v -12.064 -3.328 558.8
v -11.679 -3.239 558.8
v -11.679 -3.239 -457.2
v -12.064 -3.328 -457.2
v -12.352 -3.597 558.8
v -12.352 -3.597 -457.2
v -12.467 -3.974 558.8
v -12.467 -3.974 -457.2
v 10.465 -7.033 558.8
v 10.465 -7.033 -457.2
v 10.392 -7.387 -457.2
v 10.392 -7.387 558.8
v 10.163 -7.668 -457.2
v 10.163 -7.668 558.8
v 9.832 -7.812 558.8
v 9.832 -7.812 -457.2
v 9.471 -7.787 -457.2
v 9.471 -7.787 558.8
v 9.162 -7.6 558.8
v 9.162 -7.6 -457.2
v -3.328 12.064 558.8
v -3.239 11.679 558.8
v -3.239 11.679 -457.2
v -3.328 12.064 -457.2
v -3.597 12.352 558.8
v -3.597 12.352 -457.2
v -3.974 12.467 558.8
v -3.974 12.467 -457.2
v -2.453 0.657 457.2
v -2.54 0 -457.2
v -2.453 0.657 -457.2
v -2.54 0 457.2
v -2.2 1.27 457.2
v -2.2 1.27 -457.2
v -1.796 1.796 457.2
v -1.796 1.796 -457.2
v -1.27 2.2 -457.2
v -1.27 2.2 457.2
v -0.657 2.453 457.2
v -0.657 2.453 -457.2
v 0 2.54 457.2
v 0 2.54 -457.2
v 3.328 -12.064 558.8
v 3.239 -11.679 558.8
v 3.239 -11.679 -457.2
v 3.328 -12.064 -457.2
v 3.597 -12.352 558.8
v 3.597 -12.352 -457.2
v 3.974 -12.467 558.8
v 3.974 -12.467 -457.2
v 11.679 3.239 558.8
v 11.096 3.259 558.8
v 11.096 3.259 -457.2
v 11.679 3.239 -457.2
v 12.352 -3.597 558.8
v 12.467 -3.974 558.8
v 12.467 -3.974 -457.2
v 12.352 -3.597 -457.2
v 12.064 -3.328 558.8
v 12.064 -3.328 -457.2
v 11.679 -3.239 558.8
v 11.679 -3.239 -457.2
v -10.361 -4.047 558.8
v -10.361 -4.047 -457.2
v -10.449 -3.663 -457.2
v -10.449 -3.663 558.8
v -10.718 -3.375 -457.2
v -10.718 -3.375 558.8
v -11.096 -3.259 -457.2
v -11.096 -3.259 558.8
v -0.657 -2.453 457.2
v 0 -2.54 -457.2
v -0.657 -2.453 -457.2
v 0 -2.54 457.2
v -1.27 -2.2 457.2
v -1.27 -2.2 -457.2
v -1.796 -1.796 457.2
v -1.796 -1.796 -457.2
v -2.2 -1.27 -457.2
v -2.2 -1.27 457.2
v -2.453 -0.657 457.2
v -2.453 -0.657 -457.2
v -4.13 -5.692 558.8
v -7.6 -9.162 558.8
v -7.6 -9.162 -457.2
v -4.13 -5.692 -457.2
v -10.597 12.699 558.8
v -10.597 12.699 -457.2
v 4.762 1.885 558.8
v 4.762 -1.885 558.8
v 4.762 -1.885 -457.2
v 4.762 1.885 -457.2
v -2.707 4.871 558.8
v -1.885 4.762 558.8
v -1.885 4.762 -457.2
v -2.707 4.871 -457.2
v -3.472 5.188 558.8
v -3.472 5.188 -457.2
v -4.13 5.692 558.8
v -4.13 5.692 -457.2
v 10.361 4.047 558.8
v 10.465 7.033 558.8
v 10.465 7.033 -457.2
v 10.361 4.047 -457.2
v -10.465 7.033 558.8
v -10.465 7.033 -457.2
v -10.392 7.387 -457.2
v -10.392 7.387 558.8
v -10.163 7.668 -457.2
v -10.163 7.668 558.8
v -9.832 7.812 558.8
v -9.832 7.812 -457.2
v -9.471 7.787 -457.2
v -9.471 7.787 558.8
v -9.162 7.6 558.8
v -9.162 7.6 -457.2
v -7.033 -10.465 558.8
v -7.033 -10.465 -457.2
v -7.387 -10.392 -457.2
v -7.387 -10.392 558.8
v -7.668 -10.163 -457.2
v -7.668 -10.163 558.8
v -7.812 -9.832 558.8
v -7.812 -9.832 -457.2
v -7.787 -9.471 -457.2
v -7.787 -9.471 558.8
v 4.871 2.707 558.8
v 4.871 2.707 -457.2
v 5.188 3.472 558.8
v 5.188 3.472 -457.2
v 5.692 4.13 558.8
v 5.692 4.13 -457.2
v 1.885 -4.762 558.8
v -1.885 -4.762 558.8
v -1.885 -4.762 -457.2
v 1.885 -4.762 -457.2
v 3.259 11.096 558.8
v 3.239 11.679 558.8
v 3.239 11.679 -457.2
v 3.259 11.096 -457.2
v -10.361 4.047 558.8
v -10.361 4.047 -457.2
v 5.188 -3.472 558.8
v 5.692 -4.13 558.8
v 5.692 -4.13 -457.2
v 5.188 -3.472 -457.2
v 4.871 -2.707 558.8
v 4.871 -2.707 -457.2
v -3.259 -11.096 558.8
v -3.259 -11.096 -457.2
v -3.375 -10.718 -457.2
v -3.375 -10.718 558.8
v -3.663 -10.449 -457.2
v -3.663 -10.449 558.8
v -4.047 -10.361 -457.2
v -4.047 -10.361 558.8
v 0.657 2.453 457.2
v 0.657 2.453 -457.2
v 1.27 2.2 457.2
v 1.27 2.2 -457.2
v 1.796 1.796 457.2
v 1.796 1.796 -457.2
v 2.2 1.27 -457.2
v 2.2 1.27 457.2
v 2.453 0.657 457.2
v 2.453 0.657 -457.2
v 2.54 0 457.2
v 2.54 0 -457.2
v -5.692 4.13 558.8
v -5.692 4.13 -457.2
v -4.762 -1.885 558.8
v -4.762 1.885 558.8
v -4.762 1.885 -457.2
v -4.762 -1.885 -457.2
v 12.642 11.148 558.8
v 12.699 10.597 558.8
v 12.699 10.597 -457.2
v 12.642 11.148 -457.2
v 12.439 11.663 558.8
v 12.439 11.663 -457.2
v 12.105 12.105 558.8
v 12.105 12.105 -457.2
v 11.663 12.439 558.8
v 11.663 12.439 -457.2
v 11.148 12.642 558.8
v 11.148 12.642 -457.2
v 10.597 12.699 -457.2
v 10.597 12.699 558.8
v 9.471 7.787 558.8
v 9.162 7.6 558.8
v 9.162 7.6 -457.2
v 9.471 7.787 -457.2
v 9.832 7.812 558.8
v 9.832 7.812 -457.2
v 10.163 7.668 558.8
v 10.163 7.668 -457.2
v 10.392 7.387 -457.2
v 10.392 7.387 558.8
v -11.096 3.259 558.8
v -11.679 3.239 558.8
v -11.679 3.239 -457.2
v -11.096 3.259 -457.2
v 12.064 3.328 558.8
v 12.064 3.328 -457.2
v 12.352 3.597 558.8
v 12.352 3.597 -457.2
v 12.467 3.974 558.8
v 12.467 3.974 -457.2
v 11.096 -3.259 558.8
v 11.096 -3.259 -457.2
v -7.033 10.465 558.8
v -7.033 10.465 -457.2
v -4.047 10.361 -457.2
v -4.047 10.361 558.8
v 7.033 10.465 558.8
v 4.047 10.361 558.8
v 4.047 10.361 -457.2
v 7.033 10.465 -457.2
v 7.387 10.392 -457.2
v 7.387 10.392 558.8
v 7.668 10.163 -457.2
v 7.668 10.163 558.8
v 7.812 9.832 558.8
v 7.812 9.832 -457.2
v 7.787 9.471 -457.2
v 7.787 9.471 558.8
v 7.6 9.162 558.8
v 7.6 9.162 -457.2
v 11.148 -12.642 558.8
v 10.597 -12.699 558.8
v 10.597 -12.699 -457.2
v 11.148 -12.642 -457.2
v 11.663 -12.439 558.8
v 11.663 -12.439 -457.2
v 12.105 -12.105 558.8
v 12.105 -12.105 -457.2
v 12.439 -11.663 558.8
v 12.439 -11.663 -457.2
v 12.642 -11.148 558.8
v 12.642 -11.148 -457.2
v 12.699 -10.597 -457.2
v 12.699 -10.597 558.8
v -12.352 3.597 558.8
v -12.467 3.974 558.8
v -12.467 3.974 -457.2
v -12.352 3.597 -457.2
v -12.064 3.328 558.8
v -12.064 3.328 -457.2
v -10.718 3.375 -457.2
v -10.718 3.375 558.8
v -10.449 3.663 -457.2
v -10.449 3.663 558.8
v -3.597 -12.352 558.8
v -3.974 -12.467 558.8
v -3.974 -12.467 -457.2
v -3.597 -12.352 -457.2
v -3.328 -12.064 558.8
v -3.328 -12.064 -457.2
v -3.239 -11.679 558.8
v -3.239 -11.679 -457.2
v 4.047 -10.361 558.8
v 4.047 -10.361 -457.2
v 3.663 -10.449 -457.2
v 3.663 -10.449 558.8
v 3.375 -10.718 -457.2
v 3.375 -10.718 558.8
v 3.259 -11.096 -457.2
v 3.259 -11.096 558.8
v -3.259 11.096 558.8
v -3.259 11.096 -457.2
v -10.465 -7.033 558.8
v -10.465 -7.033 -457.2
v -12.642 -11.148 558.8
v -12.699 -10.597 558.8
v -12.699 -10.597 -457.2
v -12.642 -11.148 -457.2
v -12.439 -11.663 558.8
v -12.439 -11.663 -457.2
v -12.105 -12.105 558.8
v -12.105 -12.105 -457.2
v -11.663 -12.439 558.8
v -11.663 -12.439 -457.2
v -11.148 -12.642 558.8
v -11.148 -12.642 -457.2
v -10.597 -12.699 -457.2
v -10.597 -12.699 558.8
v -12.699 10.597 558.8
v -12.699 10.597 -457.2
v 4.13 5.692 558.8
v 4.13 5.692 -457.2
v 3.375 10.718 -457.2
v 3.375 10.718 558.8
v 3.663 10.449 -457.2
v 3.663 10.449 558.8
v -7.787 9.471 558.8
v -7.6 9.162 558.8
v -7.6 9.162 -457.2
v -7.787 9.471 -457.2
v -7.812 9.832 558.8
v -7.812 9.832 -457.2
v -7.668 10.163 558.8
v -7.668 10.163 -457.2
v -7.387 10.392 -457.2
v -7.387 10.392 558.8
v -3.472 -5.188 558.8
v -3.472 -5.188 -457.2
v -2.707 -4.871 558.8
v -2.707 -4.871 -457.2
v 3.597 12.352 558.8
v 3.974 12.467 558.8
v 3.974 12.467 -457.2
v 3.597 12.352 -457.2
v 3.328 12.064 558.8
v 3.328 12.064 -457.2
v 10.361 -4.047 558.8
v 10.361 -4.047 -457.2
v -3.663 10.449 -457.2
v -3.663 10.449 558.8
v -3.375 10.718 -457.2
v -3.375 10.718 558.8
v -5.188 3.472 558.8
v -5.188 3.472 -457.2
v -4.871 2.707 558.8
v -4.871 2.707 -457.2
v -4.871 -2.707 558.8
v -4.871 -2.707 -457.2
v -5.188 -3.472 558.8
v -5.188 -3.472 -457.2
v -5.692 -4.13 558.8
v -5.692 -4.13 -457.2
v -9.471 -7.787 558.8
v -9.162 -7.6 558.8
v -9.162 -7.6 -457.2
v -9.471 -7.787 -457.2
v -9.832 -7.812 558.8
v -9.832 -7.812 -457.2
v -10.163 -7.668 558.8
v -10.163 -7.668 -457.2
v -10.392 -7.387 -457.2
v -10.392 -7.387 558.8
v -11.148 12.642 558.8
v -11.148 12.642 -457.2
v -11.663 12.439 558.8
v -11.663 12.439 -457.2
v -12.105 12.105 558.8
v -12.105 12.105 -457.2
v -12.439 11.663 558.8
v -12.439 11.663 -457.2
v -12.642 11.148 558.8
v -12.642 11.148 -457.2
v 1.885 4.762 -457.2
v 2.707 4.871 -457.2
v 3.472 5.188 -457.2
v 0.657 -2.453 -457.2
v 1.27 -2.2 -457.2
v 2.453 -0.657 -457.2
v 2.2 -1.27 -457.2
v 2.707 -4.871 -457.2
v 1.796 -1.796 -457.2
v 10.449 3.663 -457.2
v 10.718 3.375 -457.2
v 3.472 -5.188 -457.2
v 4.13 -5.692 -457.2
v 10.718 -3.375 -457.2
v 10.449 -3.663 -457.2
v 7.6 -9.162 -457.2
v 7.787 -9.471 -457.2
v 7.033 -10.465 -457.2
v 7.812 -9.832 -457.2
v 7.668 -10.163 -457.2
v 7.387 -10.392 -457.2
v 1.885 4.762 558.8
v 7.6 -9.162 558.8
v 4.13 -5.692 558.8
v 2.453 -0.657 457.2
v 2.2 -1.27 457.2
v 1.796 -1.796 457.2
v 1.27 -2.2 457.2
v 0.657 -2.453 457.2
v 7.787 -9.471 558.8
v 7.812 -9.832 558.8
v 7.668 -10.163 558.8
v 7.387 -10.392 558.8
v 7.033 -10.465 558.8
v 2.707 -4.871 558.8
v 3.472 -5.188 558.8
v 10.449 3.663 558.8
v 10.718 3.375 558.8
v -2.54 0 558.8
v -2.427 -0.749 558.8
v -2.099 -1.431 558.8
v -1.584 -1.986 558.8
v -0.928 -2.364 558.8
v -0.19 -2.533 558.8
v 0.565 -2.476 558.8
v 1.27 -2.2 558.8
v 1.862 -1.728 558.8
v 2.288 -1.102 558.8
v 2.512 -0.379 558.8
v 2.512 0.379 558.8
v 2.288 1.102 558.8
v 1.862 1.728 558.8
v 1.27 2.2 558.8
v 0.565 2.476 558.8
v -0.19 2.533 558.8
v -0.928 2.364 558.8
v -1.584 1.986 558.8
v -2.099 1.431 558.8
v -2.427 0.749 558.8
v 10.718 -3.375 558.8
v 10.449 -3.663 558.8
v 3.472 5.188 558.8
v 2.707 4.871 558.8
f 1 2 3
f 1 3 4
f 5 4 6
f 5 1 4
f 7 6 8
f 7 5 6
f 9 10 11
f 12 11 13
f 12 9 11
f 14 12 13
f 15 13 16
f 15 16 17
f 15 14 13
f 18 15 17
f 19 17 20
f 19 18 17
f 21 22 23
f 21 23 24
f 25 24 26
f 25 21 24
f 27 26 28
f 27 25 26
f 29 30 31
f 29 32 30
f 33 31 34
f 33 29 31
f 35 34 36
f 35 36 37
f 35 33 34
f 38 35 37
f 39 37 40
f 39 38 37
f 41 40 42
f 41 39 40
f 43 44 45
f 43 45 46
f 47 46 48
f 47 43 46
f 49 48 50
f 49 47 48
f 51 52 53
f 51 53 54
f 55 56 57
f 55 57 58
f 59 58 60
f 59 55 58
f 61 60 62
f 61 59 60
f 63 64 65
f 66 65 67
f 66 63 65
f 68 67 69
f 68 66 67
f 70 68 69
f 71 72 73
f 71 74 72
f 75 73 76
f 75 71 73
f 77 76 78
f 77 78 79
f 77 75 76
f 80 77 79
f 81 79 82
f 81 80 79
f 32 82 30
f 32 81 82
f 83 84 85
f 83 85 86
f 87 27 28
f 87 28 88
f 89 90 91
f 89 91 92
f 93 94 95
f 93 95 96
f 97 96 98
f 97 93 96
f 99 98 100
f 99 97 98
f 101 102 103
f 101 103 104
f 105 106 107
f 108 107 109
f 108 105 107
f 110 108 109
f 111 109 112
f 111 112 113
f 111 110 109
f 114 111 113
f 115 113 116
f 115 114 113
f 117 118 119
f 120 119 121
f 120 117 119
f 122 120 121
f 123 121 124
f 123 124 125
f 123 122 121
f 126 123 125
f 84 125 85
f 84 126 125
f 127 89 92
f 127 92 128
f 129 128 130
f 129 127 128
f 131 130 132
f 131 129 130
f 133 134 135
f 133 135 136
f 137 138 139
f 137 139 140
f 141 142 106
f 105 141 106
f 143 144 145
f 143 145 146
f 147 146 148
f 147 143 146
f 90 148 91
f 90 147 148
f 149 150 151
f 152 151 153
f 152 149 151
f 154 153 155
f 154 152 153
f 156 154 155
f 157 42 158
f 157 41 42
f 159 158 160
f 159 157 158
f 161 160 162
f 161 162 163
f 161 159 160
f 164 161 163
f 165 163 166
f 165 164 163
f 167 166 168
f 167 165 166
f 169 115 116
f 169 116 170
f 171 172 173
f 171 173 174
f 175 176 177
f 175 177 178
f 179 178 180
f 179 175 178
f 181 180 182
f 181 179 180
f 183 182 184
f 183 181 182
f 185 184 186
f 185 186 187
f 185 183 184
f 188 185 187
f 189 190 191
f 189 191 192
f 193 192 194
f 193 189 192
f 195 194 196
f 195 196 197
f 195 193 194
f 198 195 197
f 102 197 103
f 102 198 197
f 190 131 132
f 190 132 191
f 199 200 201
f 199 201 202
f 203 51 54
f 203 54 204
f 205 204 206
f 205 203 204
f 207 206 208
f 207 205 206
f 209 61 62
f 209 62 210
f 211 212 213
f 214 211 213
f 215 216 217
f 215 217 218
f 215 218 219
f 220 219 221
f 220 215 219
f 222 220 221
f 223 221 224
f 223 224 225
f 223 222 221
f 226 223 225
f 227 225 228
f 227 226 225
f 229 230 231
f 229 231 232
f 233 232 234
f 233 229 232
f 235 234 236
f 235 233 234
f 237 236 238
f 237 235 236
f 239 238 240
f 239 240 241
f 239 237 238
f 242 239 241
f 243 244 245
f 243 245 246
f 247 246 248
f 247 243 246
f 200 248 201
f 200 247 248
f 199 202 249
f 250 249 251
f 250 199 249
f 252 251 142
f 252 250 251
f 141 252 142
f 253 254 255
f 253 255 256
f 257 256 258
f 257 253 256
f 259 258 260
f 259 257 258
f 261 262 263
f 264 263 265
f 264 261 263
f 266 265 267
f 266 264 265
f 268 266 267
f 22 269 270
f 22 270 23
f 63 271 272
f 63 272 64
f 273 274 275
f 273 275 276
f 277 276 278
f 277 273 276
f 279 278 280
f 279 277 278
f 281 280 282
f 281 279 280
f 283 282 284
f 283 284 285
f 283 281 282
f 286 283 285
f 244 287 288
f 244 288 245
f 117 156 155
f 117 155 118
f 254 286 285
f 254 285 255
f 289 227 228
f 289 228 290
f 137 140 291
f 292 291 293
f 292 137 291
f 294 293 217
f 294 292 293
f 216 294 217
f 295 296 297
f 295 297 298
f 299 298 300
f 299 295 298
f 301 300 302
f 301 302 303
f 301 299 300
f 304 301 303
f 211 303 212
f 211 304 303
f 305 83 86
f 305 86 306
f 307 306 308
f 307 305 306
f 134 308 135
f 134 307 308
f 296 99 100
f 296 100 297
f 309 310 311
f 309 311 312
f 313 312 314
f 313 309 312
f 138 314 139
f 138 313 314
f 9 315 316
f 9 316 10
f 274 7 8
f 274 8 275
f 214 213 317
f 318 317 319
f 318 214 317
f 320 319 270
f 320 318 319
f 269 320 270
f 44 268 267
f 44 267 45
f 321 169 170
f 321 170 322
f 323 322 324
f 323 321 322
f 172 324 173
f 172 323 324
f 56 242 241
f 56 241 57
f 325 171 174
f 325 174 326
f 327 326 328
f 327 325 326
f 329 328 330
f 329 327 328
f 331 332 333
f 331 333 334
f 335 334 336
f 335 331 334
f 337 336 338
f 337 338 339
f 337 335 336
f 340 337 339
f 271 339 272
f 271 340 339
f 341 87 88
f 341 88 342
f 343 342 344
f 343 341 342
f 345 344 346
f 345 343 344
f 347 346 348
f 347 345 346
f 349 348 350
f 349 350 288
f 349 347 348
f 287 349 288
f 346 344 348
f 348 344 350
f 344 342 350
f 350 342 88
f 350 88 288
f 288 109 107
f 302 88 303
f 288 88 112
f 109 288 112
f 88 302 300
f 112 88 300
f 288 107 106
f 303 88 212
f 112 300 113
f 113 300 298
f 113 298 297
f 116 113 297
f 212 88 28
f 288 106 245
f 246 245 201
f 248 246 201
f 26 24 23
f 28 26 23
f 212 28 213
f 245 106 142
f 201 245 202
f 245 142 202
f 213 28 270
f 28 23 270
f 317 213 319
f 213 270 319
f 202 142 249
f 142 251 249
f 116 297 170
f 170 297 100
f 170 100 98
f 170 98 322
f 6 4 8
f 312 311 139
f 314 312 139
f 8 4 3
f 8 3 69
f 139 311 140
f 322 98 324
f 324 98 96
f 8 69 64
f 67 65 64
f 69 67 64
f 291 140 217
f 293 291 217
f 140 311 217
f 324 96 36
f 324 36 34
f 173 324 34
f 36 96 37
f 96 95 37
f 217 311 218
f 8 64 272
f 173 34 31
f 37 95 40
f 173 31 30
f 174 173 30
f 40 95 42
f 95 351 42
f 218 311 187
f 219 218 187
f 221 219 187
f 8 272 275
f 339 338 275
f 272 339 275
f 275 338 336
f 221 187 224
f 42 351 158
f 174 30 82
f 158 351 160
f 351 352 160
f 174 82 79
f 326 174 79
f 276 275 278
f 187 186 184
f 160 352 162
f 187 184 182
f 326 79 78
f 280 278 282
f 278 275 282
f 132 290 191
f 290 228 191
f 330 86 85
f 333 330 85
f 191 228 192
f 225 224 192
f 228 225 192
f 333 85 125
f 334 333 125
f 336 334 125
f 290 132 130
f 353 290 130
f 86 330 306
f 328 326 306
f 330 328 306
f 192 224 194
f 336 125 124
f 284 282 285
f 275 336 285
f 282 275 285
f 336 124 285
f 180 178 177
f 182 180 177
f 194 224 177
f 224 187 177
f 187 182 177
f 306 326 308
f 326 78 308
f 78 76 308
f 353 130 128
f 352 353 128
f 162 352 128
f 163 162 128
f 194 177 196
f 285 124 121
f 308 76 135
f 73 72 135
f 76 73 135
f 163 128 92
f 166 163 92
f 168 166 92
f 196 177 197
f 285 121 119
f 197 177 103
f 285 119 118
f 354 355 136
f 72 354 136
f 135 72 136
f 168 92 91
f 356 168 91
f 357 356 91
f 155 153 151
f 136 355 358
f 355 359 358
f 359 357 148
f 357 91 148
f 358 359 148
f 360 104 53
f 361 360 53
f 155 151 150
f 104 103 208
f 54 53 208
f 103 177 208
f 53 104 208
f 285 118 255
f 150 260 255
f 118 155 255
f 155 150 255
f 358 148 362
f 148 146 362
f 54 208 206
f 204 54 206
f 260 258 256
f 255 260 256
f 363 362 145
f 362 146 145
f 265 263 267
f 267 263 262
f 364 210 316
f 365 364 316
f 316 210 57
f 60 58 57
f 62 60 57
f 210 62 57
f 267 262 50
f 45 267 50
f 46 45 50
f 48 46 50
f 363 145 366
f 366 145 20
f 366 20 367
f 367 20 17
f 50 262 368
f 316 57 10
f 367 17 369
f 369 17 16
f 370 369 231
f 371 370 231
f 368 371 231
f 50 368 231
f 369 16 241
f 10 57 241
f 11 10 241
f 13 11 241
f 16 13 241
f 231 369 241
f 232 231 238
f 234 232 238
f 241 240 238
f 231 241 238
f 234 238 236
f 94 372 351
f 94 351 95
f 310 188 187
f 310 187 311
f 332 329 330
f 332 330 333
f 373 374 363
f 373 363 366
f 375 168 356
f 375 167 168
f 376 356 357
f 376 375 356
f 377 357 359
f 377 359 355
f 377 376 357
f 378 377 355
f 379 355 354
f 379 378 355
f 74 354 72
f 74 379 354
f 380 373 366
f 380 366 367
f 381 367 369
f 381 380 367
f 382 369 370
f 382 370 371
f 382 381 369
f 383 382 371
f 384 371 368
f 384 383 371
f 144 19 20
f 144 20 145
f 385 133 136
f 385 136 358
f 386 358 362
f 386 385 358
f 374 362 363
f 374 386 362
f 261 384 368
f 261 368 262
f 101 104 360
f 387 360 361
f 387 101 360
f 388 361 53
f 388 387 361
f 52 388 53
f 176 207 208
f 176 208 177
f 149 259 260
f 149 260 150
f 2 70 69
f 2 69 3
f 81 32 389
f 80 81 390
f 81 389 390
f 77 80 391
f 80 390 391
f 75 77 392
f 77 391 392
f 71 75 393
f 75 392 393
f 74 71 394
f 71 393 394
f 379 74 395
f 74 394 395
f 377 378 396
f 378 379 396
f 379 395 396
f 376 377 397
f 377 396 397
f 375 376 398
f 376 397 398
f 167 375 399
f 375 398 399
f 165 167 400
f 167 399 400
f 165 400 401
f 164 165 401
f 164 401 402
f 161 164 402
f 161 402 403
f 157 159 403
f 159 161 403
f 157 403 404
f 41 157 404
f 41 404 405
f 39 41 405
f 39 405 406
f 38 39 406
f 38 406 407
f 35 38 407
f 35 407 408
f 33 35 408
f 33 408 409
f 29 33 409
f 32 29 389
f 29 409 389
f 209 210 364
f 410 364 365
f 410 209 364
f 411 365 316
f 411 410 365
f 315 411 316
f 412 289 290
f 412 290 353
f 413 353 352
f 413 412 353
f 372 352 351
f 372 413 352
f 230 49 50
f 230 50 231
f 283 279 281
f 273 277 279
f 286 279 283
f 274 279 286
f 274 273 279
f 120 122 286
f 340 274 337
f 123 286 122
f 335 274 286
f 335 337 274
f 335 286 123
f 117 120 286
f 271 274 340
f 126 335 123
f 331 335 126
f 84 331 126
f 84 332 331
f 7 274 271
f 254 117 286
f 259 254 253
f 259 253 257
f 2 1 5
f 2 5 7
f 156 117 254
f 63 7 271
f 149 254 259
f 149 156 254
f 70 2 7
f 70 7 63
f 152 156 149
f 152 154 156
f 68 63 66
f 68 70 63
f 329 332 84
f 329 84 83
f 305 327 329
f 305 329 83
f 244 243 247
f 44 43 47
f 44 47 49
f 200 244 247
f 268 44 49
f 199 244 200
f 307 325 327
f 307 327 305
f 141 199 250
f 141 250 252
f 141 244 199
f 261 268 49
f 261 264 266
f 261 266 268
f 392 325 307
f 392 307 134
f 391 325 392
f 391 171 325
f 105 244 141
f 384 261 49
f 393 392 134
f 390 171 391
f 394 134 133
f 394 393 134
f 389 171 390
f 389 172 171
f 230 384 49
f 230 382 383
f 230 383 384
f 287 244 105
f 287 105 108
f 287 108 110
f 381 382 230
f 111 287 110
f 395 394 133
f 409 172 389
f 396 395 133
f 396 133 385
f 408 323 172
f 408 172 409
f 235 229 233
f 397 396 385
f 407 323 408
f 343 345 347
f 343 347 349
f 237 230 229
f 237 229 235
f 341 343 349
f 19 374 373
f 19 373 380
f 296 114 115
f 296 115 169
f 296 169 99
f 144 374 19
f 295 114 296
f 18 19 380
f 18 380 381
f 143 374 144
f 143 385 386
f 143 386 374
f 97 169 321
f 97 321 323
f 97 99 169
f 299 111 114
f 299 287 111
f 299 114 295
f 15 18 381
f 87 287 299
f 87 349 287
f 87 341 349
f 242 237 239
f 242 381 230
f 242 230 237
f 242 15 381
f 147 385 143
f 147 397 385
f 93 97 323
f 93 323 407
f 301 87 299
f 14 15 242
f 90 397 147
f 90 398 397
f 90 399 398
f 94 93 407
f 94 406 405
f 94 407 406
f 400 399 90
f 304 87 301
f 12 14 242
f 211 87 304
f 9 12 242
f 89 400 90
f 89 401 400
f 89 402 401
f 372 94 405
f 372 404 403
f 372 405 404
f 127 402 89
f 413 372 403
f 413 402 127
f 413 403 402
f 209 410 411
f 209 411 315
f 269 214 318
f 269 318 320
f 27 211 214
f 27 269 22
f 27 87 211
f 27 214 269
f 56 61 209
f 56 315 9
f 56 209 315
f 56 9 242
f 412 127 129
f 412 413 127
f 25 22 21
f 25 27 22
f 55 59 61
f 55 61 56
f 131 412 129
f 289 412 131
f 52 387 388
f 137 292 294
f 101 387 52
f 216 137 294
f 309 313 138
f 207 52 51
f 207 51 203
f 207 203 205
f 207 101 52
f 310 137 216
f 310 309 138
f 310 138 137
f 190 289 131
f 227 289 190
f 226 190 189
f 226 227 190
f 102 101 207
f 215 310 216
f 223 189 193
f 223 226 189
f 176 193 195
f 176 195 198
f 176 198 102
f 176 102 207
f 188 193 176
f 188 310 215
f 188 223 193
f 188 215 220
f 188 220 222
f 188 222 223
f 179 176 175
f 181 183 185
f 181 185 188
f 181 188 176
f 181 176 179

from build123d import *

# Parameters (mm, degrees)
BOSS_EXTRUDE1_DEPTH = 457.2
CIRPATTERN1_COUNT   = 4
BOSS_EXTRUDE2_START = 101.6
SKETCH4_R           = 2.54
BOSS_EXTRUDE2_DEPTH = 101.6


with BuildPart() as part:
    # Sketch3 → Boss-Extrude1 (new, symmetric)
    with BuildSketch(Plane.XY):
        with BuildLine():
            Line((0, 4.7625), (-1.884807374, 4.7625))
            ThreePointArc((-1.884807374, 4.7625), (-3.099827272, 5.004182484), (-4.129871405, 5.69243597))
            Line((-4.129871405, 5.69243597), (-7.599623114, 9.162187679))
            ThreePointArc((-7.599623114, 9.162187679), (-7.759888701, 10.006330839), (-7.033220609, 10.464824259))
            Line((-7.033220609, 10.464824259), (-4.047481702, 10.360559959))
            ThreePointArc((-4.047481702, 10.360559959), (-3.501205536, 10.564804249), (-3.259352476, 11.095502353))
            Line((-3.259352476, 11.095502353), (-3.23896419, 11.679346474))
            ThreePointArc((-3.23896419, 11.679346474), (-3.443208479, 12.225622641), (-3.973906584, 12.467475701))
            Line((-3.973906584, 12.467475701), (-10.597084223, 12.698762161))
            ThreePointArc((-10.597084223, 12.698762161), (-12.104840979, 12.104840979), (-12.698762161, 10.597084223))
            Line((-12.698762161, 10.597084223), (-12.467475701, 3.973906584))
            ThreePointArc((-12.467475701, 3.973906584), (-12.225622641, 3.443208479), (-11.679346474, 3.23896419))
            Line((-11.679346474, 3.23896419), (-11.095502353, 3.259352476))
            ThreePointArc((-11.095502353, 3.259352476), (-10.564804249, 3.501205536), (-10.360559959, 4.047481702))
            Line((-10.360559959, 4.047481702), (-10.464824259, 7.033220609))
            ThreePointArc((-10.464824259, 7.033220609), (-10.006330839, 7.759888701), (-9.162187679, 7.599623114))
            Line((-9.162187679, 7.599623114), (-5.69243597, 4.129871405))
            ThreePointArc((-5.69243597, 4.129871405), (-5.004182484, 3.099827272), (-4.7625, 1.884807374))
            Line((-4.7625, 1.884807374), (-4.7625, 0))
            Line((-4.7625, 0), (-2.54, 0))
            ThreePointArc((-2.54, 0), (-1.796051224, 1.796051224), (0, 2.54))
            Line((0, 2.54), (0, 4.7625))
        make_face()
    boss_extrude1 = extrude(amount=BOSS_EXTRUDE1_DEPTH, both=True)

    # CirPattern1: Boss-Extrude1 ×4 about axis
    cirpattern1_axis = Axis((0, 0, 0), (0, 0, 1))
    for i in range(1, CIRPATTERN1_COUNT):
        add(boss_extrude1.rotate(cirpattern1_axis, i * 360 / CIRPATTERN1_COUNT))

    # Sketch4 → Boss-Extrude2 (add)
    with BuildSketch(Plane.XY.offset(457.2).offset(BOSS_EXTRUDE2_START)):
        with BuildLine():
            Line((1.884807374, 4.7625), (-1.884807374, 4.7625))
            ThreePointArc((-1.884807374, 4.7625), (-3.099827272, 5.004182484), (-4.129871405, 5.69243597))
            Line((-4.129871405, 5.69243597), (-7.599623114, 9.162187679))
            ThreePointArc((-7.599623114, 9.162187679), (-7.759888701, 10.006330839), (-7.033220609, 10.464824259))
            Line((-7.033220609, 10.464824259), (-4.047481702, 10.360559959))
            ThreePointArc((-4.047481702, 10.360559959), (-3.501205536, 10.564804249), (-3.259352476, 11.095502353))
            Line((-3.259352476, 11.095502353), (-3.23896419, 11.679346474))
            ThreePointArc((-3.23896419, 11.679346474), (-3.443208479, 12.225622641), (-3.973906584, 12.467475701))
            Line((-3.973906584, 12.467475701), (-10.597084223, 12.698762161))
            ThreePointArc((-10.597084223, 12.698762161), (-12.104840979, 12.104840979), (-12.698762161, 10.597084223))
            Line((-12.698762161, 10.597084223), (-12.467475701, 3.973906584))
            ThreePointArc((-12.467475701, 3.973906584), (-12.225622641, 3.443208479), (-11.679346474, 3.23896419))
            Line((-11.679346474, 3.23896419), (-11.095502353, 3.259352476))
            ThreePointArc((-11.095502353, 3.259352476), (-10.564804249, 3.501205536), (-10.360559959, 4.047481702))
            Line((-10.360559959, 4.047481702), (-10.464824259, 7.033220609))
            ThreePointArc((-10.464824259, 7.033220609), (-10.006330839, 7.759888701), (-9.162187679, 7.599623114))
            Line((-9.162187679, 7.599623114), (-5.69243597, 4.129871405))
            ThreePointArc((-5.69243597, 4.129871405), (-5.004182484, 3.099827272), (-4.7625, 1.884807374))
            Line((-4.7625, 1.884807374), (-4.7625, -1.884807374))
            ThreePointArc((-4.7625, -1.884807374), (-5.004182484, -3.099827272), (-5.69243597, -4.129871405))
            Line((-5.69243597, -4.129871405), (-9.162187679, -7.599623114))
            ThreePointArc((-9.162187679, -7.599623114), (-10.006330839, -7.759888701), (-10.464824259, -7.033220609))
            Line((-10.464824259, -7.033220609), (-10.360559959, -4.047481702))
            ThreePointArc((-10.360559959, -4.047481702), (-10.564804249, -3.501205536), (-11.095502353, -3.259352476))
            Line((-11.095502353, -3.259352476), (-11.679346474, -3.23896419))
            ThreePointArc((-11.679346474, -3.23896419), (-12.225622641, -3.443208479), (-12.467475701, -3.973906584))
            Line((-12.467475701, -3.973906584), (-12.698762161, -10.597084223))
            ThreePointArc((-12.698762161, -10.597084223), (-12.104840979, -12.104840979), (-10.597084223, -12.698762161))
            Line((-10.597084223, -12.698762161), (-3.973906584, -12.467475701))
            ThreePointArc((-3.973906584, -12.467475701), (-3.443208479, -12.225622641), (-3.23896419, -11.679346474))
            Line((-3.23896419, -11.679346474), (-3.259352476, -11.095502353))
            ThreePointArc((-3.259352476, -11.095502353), (-3.501205536, -10.564804249), (-4.047481702, -10.360559959))
            Line((-4.047481702, -10.360559959), (-7.033220609, -10.464824259))
            ThreePointArc((-7.033220609, -10.464824259), (-7.759888701, -10.006330839), (-7.599623114, -9.162187679))
            Line((-7.599623114, -9.162187679), (-4.129871405, -5.69243597))
            ThreePointArc((-4.129871405, -5.69243597), (-3.099827272, -5.004182484), (-1.884807374, -4.7625))
            Line((-1.884807374, -4.7625), (1.884807374, -4.7625))
            ThreePointArc((1.884807374, -4.7625), (3.099827272, -5.004182484), (4.129871405, -5.69243597))
            Line((4.129871405, -5.69243597), (7.599623114, -9.162187679))
            ThreePointArc((7.599623114, -9.162187679), (7.759888701, -10.006330839), (7.033220609, -10.464824259))
            Line((7.033220609, -10.464824259), (4.047481702, -10.360559959))
            ThreePointArc((4.047481702, -10.360559959), (3.501205536, -10.564804249), (3.259352476, -11.095502353))
            Line((3.259352476, -11.095502353), (3.23896419, -11.679346474))
            ThreePointArc((3.23896419, -11.679346474), (3.443208479, -12.225622641), (3.973906584, -12.467475701))
            Line((3.973906584, -12.467475701), (10.597084223, -12.698762161))
            ThreePointArc((10.597084223, -12.698762161), (12.104840979, -12.104840979), (12.698762161, -10.597084223))
            Line((12.698762161, -10.597084223), (12.467475701, -3.973906584))
            ThreePointArc((12.467475701, -3.973906584), (12.225622641, -3.443208479), (11.679346474, -3.23896419))
            Line((11.679346474, -3.23896419), (11.095502353, -3.259352476))
            ThreePointArc((11.095502353, -3.259352476), (10.564804249, -3.501205536), (10.360559959, -4.047481702))
            Line((10.360559959, -4.047481702), (10.464824259, -7.033220609))
            ThreePointArc((10.464824259, -7.033220609), (10.006330839, -7.759888701), (9.162187679, -7.599623114))
            Line((9.162187679, -7.599623114), (5.69243597, -4.129871405))
            ThreePointArc((5.69243597, -4.129871405), (5.004182484, -3.099827272), (4.7625, -1.884807374))
            Line((4.7625, -1.884807374), (4.7625, 1.884807374))
            ThreePointArc((4.7625, 1.884807374), (5.004182484, 3.099827272), (5.69243597, 4.129871405))
            Line((5.69243597, 4.129871405), (9.162187679, 7.599623114))
            ThreePointArc((9.162187679, 7.599623114), (10.006330839, 7.759888701), (10.464824259, 7.033220609))
            Line((10.464824259, 7.033220609), (10.360559959, 4.047481702))
            ThreePointArc((10.360559959, 4.047481702), (10.564804249, 3.501205536), (11.095502353, 3.259352476))
            Line((11.095502353, 3.259352476), (11.679346474, 3.23896419))
            ThreePointArc((11.679346474, 3.23896419), (12.225622641, 3.443208479), (12.467475701, 3.973906584))
            Line((12.467475701, 3.973906584), (12.698762161, 10.597084223))
            ThreePointArc((12.698762161, 10.597084223), (12.104840979, 12.104840979), (10.597084223, 12.698762161))
            Line((10.597084223, 12.698762161), (3.973906584, 12.467475701))
            ThreePointArc((3.973906584, 12.467475701), (3.443208479, 12.225622641), (3.23896419, 11.679346474))
            Line((3.23896419, 11.679346474), (3.259352476, 11.095502353))
            ThreePointArc((3.259352476, 11.095502353), (3.501205536, 10.564804249), (4.047481702, 10.360559959))
            Line((4.047481702, 10.360559959), (7.033220609, 10.464824259))
            ThreePointArc((7.033220609, 10.464824259), (7.759888701, 10.006330839), (7.599623114, 9.162187679))
            Line((7.599623114, 9.162187679), (4.129871405, 5.69243597))
            ThreePointArc((4.129871405, 5.69243597), (3.099827272, 5.004182484), (1.884807374, 4.7625))
        make_face()
        with Locations(Location((0, 0, 0), (0, 0, 180))):
            Circle(SKETCH4_R, mode=Mode.SUBTRACT)
    extrude(amount=-BOSS_EXTRUDE2_DEPTH)


solid = part.part
